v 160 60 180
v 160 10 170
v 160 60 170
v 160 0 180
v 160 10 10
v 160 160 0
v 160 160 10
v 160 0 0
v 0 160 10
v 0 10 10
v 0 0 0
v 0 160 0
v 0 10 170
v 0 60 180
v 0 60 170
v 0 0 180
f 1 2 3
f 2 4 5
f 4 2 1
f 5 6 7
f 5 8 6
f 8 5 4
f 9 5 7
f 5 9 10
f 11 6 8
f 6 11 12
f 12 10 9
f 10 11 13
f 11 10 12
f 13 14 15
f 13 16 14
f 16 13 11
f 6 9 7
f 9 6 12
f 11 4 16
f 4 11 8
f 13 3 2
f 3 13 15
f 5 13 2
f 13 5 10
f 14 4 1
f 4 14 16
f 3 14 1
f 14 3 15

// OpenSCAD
cube([160,160,10]);

translate([0,0,10])
cube([160,10,160]);

translate([0,0,170])
cube([160,60,10]);
